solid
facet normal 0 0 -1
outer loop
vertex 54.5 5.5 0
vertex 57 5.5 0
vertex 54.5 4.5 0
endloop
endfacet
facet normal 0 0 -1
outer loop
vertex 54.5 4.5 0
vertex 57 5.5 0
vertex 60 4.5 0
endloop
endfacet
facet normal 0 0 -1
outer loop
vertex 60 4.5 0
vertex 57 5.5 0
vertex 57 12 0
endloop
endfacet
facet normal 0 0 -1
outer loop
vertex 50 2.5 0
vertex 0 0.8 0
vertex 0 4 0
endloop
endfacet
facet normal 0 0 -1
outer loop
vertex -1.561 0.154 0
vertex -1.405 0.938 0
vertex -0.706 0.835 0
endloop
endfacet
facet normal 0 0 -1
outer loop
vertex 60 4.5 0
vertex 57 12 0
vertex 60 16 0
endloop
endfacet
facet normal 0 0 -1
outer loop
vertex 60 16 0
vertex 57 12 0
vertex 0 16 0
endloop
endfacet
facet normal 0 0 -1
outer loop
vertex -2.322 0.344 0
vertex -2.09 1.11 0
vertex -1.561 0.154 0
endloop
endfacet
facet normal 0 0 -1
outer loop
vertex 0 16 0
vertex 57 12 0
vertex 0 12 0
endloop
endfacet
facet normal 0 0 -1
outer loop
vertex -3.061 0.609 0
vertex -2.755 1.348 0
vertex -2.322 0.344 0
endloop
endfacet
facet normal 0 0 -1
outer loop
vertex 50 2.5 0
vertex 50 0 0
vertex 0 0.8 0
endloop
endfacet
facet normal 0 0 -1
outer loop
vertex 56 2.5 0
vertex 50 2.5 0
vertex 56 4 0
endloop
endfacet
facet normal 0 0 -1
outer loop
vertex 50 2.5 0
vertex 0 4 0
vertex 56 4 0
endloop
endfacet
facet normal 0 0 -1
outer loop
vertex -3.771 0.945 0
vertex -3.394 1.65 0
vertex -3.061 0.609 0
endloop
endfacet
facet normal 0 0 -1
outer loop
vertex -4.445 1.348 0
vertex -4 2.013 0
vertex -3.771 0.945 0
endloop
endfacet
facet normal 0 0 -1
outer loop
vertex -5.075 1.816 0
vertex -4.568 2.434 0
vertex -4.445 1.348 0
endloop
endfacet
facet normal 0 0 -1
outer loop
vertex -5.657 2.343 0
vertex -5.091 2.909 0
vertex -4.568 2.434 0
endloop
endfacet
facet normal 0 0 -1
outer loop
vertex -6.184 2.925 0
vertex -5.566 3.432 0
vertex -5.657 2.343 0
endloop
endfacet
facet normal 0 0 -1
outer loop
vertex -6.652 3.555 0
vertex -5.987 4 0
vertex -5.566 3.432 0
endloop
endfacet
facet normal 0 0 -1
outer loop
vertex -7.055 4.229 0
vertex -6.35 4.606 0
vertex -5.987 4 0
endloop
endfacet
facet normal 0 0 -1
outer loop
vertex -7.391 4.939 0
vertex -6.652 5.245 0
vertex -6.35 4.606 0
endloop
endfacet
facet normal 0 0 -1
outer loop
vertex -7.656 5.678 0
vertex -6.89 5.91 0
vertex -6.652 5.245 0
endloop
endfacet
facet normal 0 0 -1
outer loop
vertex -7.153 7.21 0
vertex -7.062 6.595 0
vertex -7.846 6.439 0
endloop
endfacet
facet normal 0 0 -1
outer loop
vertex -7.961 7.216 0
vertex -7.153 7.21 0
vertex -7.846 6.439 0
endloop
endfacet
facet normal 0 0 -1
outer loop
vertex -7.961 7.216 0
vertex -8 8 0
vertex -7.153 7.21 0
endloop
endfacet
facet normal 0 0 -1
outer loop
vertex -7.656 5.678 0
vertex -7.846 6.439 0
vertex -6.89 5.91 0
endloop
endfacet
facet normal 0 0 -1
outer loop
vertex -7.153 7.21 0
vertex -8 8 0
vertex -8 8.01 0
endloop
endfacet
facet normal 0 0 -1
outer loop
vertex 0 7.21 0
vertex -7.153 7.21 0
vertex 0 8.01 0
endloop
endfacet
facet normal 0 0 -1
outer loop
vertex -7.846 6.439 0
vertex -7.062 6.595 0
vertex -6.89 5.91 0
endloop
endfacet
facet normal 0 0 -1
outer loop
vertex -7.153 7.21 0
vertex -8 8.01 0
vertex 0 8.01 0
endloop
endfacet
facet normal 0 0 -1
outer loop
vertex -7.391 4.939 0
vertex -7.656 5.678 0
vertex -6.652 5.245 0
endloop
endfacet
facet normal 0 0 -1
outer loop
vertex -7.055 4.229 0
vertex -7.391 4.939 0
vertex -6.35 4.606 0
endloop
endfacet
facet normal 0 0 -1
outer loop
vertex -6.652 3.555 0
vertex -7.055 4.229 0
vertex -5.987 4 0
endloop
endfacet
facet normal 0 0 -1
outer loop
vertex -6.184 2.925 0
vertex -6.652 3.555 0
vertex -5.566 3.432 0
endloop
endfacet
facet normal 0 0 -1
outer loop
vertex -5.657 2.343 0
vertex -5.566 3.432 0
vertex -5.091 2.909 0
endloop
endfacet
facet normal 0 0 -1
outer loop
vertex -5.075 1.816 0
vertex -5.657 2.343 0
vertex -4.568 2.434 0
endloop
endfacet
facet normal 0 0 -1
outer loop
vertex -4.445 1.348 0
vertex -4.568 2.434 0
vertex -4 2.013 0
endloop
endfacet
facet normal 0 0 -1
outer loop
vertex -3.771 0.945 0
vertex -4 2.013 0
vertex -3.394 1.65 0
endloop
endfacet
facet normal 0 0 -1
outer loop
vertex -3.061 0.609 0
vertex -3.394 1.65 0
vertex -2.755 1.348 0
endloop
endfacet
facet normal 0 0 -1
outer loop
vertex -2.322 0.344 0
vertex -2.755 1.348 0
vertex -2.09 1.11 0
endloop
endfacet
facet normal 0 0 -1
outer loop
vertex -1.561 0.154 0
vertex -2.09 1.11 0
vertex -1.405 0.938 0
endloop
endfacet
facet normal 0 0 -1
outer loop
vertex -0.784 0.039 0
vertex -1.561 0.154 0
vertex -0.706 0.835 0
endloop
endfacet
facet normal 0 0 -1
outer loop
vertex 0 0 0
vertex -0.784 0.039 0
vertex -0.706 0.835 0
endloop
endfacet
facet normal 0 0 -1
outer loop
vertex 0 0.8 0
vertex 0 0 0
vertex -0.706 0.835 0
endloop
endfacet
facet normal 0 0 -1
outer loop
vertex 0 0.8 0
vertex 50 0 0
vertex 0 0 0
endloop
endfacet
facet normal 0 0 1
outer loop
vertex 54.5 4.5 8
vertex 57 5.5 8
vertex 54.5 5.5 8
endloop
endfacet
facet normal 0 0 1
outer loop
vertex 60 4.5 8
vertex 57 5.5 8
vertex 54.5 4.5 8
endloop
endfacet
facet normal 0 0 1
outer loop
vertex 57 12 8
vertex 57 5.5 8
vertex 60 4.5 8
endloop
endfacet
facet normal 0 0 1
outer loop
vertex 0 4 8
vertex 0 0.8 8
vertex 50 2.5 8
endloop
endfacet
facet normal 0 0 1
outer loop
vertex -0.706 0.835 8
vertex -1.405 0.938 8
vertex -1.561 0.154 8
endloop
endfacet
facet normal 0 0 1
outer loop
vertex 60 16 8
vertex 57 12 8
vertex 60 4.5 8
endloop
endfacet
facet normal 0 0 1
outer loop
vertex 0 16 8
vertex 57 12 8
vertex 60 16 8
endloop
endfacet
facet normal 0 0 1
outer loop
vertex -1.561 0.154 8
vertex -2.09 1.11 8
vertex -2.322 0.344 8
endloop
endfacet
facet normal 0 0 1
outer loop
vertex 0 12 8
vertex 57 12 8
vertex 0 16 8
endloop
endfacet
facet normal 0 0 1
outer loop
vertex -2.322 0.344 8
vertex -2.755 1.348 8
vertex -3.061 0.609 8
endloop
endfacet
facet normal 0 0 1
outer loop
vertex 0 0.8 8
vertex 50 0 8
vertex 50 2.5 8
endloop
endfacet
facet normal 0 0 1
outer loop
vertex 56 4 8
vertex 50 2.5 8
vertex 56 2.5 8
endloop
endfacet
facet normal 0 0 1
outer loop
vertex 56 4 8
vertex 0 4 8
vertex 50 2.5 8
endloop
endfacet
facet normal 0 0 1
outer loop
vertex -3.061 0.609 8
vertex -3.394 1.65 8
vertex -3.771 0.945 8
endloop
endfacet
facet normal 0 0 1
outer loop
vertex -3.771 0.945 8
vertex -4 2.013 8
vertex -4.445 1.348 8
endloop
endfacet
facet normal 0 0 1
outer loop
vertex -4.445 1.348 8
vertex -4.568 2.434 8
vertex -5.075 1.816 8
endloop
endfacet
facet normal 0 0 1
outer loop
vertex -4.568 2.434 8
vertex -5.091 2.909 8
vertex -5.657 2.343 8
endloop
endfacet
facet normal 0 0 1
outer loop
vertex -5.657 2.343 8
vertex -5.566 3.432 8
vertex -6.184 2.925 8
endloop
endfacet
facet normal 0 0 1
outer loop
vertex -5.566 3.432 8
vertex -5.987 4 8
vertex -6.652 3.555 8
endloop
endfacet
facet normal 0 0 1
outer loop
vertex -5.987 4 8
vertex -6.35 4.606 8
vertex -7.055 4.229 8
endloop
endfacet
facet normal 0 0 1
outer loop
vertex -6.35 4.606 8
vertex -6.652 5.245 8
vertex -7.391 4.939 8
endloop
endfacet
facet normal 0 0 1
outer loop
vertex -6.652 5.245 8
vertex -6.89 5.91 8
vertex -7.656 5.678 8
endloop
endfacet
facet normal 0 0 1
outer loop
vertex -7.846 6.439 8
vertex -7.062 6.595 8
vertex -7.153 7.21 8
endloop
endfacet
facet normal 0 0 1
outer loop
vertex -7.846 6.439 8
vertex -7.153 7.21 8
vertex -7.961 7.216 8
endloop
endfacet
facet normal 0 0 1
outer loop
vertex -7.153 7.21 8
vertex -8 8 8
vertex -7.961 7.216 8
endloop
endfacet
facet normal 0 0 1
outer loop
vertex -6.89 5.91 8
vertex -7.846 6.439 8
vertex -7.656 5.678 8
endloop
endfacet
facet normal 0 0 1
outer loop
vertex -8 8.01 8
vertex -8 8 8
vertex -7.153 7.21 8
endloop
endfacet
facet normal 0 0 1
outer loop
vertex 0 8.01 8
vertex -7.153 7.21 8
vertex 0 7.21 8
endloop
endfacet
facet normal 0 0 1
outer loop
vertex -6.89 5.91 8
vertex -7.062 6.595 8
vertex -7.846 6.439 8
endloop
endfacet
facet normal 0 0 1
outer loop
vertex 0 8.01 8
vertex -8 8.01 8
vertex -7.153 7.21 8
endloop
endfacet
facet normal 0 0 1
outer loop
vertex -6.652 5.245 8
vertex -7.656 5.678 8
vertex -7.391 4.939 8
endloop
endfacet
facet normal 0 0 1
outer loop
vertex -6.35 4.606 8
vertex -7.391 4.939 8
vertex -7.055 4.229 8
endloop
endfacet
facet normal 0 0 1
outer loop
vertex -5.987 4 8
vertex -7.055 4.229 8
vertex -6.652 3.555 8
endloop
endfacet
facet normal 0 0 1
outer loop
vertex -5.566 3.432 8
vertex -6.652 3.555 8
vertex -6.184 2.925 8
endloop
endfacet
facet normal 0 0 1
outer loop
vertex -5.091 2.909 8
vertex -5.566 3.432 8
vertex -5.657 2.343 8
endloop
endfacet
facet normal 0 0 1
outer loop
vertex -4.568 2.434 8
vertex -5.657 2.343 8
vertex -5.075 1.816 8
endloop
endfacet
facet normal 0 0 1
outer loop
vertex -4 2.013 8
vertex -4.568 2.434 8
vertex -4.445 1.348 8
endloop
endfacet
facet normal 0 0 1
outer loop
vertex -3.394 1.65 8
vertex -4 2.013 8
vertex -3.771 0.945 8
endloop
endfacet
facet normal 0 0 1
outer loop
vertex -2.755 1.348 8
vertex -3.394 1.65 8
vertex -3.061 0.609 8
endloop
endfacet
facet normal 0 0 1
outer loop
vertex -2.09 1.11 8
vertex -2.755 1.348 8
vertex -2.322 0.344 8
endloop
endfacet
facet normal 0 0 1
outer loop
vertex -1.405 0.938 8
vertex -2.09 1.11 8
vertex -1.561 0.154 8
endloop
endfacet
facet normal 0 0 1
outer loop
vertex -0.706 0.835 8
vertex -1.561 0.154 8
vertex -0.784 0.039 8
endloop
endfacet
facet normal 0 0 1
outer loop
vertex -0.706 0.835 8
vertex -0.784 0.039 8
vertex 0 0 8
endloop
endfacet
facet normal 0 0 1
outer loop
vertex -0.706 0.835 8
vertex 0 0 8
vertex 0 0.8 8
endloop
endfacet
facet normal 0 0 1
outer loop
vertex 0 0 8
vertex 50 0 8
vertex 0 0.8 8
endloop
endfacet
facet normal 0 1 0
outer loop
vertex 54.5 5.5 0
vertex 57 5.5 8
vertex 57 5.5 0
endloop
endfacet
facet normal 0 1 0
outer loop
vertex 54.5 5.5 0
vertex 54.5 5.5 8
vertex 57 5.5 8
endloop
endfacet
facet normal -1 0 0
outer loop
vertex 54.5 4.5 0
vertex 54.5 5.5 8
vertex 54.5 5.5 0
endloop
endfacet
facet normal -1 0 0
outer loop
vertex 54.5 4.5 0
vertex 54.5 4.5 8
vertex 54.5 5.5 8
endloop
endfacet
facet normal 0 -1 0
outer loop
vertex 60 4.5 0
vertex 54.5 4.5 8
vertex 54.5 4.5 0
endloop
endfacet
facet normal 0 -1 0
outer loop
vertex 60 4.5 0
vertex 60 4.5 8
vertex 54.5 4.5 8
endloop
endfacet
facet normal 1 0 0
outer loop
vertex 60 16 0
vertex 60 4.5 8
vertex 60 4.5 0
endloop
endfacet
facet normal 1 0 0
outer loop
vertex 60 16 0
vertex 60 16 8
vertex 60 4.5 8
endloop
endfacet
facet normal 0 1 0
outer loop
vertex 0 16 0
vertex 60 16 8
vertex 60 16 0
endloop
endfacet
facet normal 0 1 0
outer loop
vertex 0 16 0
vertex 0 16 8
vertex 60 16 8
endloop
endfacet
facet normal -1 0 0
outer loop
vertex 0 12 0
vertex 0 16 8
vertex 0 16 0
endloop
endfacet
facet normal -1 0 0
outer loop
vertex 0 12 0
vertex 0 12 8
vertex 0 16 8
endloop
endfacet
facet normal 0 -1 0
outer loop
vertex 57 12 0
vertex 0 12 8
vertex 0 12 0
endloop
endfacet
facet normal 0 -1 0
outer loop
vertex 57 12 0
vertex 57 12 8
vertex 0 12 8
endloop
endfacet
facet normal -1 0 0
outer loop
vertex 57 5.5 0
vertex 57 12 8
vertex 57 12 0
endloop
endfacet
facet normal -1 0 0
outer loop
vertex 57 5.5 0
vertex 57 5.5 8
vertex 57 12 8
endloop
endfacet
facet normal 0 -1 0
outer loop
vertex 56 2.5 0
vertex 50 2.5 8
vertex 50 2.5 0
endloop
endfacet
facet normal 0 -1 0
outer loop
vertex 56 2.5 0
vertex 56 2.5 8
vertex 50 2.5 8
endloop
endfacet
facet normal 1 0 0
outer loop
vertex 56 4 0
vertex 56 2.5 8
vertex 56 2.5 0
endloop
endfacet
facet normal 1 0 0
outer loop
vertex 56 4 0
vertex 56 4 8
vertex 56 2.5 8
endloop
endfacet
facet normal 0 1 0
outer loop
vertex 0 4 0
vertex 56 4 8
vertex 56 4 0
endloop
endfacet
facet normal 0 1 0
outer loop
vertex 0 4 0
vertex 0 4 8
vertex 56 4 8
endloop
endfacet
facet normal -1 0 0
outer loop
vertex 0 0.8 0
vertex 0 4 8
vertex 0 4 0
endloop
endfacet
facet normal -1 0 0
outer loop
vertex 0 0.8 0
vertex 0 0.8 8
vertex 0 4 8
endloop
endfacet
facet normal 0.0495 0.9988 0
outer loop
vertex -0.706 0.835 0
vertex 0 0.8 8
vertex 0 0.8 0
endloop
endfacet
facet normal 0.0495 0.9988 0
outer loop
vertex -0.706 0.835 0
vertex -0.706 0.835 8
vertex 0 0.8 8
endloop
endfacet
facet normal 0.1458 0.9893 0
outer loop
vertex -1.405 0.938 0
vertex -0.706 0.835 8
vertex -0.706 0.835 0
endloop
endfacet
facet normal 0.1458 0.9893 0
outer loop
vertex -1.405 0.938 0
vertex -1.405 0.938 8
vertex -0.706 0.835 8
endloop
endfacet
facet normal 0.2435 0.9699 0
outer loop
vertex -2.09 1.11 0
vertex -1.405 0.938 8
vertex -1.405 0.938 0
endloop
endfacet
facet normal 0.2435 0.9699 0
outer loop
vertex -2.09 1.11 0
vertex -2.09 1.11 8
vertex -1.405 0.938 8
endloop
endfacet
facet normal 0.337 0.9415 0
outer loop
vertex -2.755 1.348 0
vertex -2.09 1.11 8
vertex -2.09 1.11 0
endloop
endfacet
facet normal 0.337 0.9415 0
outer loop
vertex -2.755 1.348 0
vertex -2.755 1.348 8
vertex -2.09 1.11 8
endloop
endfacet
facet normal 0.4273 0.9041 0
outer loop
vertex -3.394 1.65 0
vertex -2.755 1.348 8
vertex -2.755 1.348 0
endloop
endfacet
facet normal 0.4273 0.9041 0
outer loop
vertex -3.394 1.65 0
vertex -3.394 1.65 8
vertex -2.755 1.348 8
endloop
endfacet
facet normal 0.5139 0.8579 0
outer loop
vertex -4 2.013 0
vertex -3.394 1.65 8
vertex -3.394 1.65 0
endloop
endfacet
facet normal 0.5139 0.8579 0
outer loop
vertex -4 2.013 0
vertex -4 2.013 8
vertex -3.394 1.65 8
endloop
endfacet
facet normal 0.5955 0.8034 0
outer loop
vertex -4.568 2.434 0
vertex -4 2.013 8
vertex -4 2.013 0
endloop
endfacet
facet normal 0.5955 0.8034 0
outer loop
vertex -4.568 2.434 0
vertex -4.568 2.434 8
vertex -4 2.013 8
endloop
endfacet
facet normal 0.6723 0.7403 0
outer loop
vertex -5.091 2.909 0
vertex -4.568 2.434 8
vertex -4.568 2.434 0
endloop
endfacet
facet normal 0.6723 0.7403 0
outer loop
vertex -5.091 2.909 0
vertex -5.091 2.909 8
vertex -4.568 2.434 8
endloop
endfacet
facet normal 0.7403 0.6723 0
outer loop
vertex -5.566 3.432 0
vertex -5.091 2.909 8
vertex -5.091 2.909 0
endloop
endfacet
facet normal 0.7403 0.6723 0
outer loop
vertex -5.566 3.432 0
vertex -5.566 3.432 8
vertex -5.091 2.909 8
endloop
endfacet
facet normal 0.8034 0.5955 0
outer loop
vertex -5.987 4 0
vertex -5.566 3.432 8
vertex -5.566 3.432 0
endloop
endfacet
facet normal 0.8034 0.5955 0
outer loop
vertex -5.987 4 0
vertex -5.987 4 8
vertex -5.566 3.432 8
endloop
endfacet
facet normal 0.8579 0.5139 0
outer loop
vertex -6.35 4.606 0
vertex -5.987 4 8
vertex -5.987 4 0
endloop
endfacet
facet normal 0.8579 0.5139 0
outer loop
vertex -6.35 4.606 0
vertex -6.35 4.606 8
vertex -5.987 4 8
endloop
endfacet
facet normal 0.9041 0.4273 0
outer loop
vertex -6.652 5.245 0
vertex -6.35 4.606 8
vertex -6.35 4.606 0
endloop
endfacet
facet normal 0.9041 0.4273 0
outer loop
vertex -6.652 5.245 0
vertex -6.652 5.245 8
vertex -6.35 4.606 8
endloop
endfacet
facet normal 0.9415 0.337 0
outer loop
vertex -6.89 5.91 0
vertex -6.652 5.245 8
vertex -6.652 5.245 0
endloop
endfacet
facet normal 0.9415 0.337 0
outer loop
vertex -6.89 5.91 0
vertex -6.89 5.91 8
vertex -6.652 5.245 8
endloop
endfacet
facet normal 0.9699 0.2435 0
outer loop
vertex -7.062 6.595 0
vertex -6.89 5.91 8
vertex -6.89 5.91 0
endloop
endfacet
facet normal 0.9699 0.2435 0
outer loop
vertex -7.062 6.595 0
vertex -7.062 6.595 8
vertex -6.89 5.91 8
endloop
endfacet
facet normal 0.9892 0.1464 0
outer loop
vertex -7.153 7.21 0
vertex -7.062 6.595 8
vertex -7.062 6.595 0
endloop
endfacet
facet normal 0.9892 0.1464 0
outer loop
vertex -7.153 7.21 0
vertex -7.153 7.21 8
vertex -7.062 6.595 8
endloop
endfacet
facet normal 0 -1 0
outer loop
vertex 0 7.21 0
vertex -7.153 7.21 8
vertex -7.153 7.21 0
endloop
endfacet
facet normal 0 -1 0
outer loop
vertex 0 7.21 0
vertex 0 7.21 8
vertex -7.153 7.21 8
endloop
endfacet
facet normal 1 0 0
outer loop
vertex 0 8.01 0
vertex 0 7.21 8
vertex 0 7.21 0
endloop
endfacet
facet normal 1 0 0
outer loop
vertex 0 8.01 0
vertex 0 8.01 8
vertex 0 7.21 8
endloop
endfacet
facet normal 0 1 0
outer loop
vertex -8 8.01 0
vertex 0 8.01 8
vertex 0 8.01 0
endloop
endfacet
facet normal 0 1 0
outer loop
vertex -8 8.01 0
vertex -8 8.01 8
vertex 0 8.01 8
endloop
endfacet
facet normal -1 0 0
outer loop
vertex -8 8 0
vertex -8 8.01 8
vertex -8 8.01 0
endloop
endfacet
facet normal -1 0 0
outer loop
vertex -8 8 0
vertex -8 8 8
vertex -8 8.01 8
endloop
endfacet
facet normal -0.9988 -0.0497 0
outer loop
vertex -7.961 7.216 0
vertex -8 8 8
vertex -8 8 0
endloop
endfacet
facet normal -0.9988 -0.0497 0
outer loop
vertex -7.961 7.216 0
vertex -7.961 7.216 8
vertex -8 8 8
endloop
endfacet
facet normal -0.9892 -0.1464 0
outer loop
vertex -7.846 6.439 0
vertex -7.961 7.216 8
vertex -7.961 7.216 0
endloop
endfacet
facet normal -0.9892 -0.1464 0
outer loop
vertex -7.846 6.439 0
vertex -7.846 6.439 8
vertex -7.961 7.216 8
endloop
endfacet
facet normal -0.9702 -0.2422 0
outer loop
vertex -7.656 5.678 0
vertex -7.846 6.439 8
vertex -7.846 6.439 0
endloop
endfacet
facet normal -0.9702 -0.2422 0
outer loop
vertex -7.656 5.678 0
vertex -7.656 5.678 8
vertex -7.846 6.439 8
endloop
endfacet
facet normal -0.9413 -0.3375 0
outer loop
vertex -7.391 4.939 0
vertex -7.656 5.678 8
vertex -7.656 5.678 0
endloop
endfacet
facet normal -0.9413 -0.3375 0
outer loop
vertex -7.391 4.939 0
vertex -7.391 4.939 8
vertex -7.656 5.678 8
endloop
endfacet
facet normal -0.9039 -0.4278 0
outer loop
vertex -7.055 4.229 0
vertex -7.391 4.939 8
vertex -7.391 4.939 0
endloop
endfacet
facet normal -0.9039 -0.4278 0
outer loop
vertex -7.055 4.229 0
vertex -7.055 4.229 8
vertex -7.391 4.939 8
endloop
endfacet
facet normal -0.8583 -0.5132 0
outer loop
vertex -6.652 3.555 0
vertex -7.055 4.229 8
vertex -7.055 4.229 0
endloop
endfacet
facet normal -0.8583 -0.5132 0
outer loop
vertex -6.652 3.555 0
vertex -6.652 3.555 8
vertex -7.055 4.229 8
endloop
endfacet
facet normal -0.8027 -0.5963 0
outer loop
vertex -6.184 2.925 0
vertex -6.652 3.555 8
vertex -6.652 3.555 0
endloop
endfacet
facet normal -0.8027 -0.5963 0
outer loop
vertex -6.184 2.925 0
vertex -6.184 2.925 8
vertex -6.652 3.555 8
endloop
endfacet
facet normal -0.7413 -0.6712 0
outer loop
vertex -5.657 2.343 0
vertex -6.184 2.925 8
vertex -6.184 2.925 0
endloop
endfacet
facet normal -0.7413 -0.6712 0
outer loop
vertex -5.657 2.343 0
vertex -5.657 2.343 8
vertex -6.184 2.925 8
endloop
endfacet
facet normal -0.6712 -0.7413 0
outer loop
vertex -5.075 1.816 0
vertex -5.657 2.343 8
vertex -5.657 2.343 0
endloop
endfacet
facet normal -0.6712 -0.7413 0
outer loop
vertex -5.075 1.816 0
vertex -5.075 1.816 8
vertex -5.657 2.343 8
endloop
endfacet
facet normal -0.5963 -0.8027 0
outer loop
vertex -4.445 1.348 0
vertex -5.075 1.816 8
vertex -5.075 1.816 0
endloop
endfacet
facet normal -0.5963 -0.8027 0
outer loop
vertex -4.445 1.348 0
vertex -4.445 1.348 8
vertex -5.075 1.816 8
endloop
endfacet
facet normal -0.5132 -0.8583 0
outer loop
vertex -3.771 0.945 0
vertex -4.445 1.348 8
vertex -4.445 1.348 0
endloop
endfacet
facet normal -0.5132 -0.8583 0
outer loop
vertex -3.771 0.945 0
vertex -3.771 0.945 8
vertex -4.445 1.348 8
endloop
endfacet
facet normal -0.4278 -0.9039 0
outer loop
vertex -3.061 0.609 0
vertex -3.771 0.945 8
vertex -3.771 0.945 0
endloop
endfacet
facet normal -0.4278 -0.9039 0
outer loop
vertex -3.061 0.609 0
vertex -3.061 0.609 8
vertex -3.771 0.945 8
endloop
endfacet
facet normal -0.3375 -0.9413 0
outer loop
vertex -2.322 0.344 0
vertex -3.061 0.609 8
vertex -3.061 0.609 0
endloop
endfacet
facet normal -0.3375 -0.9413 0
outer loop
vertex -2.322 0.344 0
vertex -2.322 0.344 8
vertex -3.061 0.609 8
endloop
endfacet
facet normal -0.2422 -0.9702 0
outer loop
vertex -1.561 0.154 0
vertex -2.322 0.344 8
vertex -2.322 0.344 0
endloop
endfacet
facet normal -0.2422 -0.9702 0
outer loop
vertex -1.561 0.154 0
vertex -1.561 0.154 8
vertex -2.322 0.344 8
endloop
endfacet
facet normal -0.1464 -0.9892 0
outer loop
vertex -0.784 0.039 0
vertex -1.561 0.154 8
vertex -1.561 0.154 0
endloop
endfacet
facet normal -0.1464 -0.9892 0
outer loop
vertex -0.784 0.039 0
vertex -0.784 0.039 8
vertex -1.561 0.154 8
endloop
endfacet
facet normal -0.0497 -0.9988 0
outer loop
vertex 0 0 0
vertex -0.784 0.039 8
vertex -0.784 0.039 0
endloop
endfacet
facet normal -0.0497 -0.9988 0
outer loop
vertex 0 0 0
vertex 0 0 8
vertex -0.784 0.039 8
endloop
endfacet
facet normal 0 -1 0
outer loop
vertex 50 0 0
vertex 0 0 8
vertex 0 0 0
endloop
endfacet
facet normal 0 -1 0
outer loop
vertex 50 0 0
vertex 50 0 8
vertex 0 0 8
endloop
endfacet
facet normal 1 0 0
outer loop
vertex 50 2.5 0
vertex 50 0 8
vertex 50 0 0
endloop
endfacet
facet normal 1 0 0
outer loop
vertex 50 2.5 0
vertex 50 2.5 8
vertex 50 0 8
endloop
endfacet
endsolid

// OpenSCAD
// Pinch clamp for silicone tubing (up to 6.4 mm), printed flat (XY profile, extruded in Z)
$fn = 64;

// ---- Global dimensions (mm) ----
extrude_h   = 8;    // thickness along Z (print height)

// Lower jaw
lower_bar_x0 = 0;   lower_bar_x1 = 50;  lower_bar_y0 = 0;  lower_bar_y1 = 4;
lower_tong_x0 = 50; lower_tong_x1 = 56; lower_tong_y0 = 2.5; lower_tong_y1 = 4;

// Upper jaw
upper_bar_x0 = 0;   upper_bar_x1 = 60;  upper_bar_y0 = 12; upper_bar_y1 = 16;

// Living hinge (half-ring on x < 0 side, centred at (0,8), 0.8 mm thick)
hinge_cx = 0;  hinge_cy = 8;
hinge_r_out = 8;   // outer radius
hinge_r_in  = 7.2; // inner radius

// Pinch ridges (half-round, 1.5 mm radius, on inner faces at x = 27.5)
ridge_x = 27.5;
ridge_r = 1.5;
lower_ridge_cy = 4;   // lower jaw inner face
upper_ridge_cy = 12;  // upper jaw inner face

// Snap latch (hangs from upper jaw right end)
latch_leg_x0 = 57;  latch_leg_x1 = 60;  latch_leg_y0 = 4.5;  latch_leg_y1 = 12;
latch_nose_x0 = 54.5; latch_nose_x1 = 57; latch_nose_y0 = 4.5; latch_nose_y1 = 5.5;

// ---- 2-D profile (XY plane) ----
module profile() { union() {
    // Lower jaw: bar + thinner tongue
    translate([lower_bar_x0, lower_bar_y0])
        square([lower_bar_x1 - lower_bar_x0, lower_bar_y1 - lower_bar_y0], center = false);
    translate([lower_tong_x0, lower_tong_y0])
        square([lower_tong_x1 - lower_tong_x0, lower_tong_y1 - lower_tong_y0], center = false);

    // Upper jaw bar
    translate([upper_bar_x0, upper_bar_y0])
        square([upper_bar_x1 - upper_bar_x0, upper_bar_y1 - upper_bar_y0], center = false);

    // Living hinge: half-ring (x < 0 side) centred at (0,8), radii 7.2 / 8
    difference() {
        // outer half-disc (left half of circle radius 8)
        intersection() {
            translate([hinge_cx, hinge_cy]) circle(hinge_r_out);
            translate([-hinge_r_out - 0.01, -hinge_r_out - 0.01])
                square([hinge_r_out + 0.01, 2 * hinge_r_out + 0.02], center = false);
        }
        // inner half-disc (left half of circle radius 7.2)
        intersection() {
            translate([hinge_cx, hinge_cy]) circle(hinge_r_in);
            translate([-hinge_r_in - 0.01, -hinge_r_in - 0.01])
                square([hinge_r_in + 0.01, 2 * hinge_r_in + 0.02], center = false);
        }
    }

    // Pinch ridge on lower jaw inner face (half-disc bulging into gap, y > 4)
    intersection() {
        translate([ridge_x, lower_ridge_cy]) circle(ridge_r);
        translate([-ridge_r - 0.01, 0])
            square([ridge_r + 0.01, ridge_r + 0.01], center = false);
    }

    // Pinch ridge on upper jaw inner face (half-disc bulging into gap, y < 12)
    intersection() {
        translate([ridge_x, upper_ridge_cy]) circle(ridge_r);
        translate([-ridge_r - 0.01, -ridge_r - 0.01])
            square([ridge_r + 0.01, ridge_r + 0.01], center = false);
    }

    // Latch leg
    translate([latch_leg_x0, latch_leg_y0])
        square([latch_leg_x1 - latch_leg_x0, latch_leg_y1 - latch_leg_y0], center = false);

    // Latch nose (0.5 mm above tongue top at y=4, i.e. y 4.5..5.5)
    translate([latch_nose_x0, latch_nose_y0])
        square([latch_nose_x1 - latch_nose_x0, latch_nose_y1 - latch_nose_y0], center = false);
} }

// ---- Extrude 8 mm along Z (print orientation: rests on XY plane, builds +Z) ----
linear_extrude(height = extrude_h)
    profile();
